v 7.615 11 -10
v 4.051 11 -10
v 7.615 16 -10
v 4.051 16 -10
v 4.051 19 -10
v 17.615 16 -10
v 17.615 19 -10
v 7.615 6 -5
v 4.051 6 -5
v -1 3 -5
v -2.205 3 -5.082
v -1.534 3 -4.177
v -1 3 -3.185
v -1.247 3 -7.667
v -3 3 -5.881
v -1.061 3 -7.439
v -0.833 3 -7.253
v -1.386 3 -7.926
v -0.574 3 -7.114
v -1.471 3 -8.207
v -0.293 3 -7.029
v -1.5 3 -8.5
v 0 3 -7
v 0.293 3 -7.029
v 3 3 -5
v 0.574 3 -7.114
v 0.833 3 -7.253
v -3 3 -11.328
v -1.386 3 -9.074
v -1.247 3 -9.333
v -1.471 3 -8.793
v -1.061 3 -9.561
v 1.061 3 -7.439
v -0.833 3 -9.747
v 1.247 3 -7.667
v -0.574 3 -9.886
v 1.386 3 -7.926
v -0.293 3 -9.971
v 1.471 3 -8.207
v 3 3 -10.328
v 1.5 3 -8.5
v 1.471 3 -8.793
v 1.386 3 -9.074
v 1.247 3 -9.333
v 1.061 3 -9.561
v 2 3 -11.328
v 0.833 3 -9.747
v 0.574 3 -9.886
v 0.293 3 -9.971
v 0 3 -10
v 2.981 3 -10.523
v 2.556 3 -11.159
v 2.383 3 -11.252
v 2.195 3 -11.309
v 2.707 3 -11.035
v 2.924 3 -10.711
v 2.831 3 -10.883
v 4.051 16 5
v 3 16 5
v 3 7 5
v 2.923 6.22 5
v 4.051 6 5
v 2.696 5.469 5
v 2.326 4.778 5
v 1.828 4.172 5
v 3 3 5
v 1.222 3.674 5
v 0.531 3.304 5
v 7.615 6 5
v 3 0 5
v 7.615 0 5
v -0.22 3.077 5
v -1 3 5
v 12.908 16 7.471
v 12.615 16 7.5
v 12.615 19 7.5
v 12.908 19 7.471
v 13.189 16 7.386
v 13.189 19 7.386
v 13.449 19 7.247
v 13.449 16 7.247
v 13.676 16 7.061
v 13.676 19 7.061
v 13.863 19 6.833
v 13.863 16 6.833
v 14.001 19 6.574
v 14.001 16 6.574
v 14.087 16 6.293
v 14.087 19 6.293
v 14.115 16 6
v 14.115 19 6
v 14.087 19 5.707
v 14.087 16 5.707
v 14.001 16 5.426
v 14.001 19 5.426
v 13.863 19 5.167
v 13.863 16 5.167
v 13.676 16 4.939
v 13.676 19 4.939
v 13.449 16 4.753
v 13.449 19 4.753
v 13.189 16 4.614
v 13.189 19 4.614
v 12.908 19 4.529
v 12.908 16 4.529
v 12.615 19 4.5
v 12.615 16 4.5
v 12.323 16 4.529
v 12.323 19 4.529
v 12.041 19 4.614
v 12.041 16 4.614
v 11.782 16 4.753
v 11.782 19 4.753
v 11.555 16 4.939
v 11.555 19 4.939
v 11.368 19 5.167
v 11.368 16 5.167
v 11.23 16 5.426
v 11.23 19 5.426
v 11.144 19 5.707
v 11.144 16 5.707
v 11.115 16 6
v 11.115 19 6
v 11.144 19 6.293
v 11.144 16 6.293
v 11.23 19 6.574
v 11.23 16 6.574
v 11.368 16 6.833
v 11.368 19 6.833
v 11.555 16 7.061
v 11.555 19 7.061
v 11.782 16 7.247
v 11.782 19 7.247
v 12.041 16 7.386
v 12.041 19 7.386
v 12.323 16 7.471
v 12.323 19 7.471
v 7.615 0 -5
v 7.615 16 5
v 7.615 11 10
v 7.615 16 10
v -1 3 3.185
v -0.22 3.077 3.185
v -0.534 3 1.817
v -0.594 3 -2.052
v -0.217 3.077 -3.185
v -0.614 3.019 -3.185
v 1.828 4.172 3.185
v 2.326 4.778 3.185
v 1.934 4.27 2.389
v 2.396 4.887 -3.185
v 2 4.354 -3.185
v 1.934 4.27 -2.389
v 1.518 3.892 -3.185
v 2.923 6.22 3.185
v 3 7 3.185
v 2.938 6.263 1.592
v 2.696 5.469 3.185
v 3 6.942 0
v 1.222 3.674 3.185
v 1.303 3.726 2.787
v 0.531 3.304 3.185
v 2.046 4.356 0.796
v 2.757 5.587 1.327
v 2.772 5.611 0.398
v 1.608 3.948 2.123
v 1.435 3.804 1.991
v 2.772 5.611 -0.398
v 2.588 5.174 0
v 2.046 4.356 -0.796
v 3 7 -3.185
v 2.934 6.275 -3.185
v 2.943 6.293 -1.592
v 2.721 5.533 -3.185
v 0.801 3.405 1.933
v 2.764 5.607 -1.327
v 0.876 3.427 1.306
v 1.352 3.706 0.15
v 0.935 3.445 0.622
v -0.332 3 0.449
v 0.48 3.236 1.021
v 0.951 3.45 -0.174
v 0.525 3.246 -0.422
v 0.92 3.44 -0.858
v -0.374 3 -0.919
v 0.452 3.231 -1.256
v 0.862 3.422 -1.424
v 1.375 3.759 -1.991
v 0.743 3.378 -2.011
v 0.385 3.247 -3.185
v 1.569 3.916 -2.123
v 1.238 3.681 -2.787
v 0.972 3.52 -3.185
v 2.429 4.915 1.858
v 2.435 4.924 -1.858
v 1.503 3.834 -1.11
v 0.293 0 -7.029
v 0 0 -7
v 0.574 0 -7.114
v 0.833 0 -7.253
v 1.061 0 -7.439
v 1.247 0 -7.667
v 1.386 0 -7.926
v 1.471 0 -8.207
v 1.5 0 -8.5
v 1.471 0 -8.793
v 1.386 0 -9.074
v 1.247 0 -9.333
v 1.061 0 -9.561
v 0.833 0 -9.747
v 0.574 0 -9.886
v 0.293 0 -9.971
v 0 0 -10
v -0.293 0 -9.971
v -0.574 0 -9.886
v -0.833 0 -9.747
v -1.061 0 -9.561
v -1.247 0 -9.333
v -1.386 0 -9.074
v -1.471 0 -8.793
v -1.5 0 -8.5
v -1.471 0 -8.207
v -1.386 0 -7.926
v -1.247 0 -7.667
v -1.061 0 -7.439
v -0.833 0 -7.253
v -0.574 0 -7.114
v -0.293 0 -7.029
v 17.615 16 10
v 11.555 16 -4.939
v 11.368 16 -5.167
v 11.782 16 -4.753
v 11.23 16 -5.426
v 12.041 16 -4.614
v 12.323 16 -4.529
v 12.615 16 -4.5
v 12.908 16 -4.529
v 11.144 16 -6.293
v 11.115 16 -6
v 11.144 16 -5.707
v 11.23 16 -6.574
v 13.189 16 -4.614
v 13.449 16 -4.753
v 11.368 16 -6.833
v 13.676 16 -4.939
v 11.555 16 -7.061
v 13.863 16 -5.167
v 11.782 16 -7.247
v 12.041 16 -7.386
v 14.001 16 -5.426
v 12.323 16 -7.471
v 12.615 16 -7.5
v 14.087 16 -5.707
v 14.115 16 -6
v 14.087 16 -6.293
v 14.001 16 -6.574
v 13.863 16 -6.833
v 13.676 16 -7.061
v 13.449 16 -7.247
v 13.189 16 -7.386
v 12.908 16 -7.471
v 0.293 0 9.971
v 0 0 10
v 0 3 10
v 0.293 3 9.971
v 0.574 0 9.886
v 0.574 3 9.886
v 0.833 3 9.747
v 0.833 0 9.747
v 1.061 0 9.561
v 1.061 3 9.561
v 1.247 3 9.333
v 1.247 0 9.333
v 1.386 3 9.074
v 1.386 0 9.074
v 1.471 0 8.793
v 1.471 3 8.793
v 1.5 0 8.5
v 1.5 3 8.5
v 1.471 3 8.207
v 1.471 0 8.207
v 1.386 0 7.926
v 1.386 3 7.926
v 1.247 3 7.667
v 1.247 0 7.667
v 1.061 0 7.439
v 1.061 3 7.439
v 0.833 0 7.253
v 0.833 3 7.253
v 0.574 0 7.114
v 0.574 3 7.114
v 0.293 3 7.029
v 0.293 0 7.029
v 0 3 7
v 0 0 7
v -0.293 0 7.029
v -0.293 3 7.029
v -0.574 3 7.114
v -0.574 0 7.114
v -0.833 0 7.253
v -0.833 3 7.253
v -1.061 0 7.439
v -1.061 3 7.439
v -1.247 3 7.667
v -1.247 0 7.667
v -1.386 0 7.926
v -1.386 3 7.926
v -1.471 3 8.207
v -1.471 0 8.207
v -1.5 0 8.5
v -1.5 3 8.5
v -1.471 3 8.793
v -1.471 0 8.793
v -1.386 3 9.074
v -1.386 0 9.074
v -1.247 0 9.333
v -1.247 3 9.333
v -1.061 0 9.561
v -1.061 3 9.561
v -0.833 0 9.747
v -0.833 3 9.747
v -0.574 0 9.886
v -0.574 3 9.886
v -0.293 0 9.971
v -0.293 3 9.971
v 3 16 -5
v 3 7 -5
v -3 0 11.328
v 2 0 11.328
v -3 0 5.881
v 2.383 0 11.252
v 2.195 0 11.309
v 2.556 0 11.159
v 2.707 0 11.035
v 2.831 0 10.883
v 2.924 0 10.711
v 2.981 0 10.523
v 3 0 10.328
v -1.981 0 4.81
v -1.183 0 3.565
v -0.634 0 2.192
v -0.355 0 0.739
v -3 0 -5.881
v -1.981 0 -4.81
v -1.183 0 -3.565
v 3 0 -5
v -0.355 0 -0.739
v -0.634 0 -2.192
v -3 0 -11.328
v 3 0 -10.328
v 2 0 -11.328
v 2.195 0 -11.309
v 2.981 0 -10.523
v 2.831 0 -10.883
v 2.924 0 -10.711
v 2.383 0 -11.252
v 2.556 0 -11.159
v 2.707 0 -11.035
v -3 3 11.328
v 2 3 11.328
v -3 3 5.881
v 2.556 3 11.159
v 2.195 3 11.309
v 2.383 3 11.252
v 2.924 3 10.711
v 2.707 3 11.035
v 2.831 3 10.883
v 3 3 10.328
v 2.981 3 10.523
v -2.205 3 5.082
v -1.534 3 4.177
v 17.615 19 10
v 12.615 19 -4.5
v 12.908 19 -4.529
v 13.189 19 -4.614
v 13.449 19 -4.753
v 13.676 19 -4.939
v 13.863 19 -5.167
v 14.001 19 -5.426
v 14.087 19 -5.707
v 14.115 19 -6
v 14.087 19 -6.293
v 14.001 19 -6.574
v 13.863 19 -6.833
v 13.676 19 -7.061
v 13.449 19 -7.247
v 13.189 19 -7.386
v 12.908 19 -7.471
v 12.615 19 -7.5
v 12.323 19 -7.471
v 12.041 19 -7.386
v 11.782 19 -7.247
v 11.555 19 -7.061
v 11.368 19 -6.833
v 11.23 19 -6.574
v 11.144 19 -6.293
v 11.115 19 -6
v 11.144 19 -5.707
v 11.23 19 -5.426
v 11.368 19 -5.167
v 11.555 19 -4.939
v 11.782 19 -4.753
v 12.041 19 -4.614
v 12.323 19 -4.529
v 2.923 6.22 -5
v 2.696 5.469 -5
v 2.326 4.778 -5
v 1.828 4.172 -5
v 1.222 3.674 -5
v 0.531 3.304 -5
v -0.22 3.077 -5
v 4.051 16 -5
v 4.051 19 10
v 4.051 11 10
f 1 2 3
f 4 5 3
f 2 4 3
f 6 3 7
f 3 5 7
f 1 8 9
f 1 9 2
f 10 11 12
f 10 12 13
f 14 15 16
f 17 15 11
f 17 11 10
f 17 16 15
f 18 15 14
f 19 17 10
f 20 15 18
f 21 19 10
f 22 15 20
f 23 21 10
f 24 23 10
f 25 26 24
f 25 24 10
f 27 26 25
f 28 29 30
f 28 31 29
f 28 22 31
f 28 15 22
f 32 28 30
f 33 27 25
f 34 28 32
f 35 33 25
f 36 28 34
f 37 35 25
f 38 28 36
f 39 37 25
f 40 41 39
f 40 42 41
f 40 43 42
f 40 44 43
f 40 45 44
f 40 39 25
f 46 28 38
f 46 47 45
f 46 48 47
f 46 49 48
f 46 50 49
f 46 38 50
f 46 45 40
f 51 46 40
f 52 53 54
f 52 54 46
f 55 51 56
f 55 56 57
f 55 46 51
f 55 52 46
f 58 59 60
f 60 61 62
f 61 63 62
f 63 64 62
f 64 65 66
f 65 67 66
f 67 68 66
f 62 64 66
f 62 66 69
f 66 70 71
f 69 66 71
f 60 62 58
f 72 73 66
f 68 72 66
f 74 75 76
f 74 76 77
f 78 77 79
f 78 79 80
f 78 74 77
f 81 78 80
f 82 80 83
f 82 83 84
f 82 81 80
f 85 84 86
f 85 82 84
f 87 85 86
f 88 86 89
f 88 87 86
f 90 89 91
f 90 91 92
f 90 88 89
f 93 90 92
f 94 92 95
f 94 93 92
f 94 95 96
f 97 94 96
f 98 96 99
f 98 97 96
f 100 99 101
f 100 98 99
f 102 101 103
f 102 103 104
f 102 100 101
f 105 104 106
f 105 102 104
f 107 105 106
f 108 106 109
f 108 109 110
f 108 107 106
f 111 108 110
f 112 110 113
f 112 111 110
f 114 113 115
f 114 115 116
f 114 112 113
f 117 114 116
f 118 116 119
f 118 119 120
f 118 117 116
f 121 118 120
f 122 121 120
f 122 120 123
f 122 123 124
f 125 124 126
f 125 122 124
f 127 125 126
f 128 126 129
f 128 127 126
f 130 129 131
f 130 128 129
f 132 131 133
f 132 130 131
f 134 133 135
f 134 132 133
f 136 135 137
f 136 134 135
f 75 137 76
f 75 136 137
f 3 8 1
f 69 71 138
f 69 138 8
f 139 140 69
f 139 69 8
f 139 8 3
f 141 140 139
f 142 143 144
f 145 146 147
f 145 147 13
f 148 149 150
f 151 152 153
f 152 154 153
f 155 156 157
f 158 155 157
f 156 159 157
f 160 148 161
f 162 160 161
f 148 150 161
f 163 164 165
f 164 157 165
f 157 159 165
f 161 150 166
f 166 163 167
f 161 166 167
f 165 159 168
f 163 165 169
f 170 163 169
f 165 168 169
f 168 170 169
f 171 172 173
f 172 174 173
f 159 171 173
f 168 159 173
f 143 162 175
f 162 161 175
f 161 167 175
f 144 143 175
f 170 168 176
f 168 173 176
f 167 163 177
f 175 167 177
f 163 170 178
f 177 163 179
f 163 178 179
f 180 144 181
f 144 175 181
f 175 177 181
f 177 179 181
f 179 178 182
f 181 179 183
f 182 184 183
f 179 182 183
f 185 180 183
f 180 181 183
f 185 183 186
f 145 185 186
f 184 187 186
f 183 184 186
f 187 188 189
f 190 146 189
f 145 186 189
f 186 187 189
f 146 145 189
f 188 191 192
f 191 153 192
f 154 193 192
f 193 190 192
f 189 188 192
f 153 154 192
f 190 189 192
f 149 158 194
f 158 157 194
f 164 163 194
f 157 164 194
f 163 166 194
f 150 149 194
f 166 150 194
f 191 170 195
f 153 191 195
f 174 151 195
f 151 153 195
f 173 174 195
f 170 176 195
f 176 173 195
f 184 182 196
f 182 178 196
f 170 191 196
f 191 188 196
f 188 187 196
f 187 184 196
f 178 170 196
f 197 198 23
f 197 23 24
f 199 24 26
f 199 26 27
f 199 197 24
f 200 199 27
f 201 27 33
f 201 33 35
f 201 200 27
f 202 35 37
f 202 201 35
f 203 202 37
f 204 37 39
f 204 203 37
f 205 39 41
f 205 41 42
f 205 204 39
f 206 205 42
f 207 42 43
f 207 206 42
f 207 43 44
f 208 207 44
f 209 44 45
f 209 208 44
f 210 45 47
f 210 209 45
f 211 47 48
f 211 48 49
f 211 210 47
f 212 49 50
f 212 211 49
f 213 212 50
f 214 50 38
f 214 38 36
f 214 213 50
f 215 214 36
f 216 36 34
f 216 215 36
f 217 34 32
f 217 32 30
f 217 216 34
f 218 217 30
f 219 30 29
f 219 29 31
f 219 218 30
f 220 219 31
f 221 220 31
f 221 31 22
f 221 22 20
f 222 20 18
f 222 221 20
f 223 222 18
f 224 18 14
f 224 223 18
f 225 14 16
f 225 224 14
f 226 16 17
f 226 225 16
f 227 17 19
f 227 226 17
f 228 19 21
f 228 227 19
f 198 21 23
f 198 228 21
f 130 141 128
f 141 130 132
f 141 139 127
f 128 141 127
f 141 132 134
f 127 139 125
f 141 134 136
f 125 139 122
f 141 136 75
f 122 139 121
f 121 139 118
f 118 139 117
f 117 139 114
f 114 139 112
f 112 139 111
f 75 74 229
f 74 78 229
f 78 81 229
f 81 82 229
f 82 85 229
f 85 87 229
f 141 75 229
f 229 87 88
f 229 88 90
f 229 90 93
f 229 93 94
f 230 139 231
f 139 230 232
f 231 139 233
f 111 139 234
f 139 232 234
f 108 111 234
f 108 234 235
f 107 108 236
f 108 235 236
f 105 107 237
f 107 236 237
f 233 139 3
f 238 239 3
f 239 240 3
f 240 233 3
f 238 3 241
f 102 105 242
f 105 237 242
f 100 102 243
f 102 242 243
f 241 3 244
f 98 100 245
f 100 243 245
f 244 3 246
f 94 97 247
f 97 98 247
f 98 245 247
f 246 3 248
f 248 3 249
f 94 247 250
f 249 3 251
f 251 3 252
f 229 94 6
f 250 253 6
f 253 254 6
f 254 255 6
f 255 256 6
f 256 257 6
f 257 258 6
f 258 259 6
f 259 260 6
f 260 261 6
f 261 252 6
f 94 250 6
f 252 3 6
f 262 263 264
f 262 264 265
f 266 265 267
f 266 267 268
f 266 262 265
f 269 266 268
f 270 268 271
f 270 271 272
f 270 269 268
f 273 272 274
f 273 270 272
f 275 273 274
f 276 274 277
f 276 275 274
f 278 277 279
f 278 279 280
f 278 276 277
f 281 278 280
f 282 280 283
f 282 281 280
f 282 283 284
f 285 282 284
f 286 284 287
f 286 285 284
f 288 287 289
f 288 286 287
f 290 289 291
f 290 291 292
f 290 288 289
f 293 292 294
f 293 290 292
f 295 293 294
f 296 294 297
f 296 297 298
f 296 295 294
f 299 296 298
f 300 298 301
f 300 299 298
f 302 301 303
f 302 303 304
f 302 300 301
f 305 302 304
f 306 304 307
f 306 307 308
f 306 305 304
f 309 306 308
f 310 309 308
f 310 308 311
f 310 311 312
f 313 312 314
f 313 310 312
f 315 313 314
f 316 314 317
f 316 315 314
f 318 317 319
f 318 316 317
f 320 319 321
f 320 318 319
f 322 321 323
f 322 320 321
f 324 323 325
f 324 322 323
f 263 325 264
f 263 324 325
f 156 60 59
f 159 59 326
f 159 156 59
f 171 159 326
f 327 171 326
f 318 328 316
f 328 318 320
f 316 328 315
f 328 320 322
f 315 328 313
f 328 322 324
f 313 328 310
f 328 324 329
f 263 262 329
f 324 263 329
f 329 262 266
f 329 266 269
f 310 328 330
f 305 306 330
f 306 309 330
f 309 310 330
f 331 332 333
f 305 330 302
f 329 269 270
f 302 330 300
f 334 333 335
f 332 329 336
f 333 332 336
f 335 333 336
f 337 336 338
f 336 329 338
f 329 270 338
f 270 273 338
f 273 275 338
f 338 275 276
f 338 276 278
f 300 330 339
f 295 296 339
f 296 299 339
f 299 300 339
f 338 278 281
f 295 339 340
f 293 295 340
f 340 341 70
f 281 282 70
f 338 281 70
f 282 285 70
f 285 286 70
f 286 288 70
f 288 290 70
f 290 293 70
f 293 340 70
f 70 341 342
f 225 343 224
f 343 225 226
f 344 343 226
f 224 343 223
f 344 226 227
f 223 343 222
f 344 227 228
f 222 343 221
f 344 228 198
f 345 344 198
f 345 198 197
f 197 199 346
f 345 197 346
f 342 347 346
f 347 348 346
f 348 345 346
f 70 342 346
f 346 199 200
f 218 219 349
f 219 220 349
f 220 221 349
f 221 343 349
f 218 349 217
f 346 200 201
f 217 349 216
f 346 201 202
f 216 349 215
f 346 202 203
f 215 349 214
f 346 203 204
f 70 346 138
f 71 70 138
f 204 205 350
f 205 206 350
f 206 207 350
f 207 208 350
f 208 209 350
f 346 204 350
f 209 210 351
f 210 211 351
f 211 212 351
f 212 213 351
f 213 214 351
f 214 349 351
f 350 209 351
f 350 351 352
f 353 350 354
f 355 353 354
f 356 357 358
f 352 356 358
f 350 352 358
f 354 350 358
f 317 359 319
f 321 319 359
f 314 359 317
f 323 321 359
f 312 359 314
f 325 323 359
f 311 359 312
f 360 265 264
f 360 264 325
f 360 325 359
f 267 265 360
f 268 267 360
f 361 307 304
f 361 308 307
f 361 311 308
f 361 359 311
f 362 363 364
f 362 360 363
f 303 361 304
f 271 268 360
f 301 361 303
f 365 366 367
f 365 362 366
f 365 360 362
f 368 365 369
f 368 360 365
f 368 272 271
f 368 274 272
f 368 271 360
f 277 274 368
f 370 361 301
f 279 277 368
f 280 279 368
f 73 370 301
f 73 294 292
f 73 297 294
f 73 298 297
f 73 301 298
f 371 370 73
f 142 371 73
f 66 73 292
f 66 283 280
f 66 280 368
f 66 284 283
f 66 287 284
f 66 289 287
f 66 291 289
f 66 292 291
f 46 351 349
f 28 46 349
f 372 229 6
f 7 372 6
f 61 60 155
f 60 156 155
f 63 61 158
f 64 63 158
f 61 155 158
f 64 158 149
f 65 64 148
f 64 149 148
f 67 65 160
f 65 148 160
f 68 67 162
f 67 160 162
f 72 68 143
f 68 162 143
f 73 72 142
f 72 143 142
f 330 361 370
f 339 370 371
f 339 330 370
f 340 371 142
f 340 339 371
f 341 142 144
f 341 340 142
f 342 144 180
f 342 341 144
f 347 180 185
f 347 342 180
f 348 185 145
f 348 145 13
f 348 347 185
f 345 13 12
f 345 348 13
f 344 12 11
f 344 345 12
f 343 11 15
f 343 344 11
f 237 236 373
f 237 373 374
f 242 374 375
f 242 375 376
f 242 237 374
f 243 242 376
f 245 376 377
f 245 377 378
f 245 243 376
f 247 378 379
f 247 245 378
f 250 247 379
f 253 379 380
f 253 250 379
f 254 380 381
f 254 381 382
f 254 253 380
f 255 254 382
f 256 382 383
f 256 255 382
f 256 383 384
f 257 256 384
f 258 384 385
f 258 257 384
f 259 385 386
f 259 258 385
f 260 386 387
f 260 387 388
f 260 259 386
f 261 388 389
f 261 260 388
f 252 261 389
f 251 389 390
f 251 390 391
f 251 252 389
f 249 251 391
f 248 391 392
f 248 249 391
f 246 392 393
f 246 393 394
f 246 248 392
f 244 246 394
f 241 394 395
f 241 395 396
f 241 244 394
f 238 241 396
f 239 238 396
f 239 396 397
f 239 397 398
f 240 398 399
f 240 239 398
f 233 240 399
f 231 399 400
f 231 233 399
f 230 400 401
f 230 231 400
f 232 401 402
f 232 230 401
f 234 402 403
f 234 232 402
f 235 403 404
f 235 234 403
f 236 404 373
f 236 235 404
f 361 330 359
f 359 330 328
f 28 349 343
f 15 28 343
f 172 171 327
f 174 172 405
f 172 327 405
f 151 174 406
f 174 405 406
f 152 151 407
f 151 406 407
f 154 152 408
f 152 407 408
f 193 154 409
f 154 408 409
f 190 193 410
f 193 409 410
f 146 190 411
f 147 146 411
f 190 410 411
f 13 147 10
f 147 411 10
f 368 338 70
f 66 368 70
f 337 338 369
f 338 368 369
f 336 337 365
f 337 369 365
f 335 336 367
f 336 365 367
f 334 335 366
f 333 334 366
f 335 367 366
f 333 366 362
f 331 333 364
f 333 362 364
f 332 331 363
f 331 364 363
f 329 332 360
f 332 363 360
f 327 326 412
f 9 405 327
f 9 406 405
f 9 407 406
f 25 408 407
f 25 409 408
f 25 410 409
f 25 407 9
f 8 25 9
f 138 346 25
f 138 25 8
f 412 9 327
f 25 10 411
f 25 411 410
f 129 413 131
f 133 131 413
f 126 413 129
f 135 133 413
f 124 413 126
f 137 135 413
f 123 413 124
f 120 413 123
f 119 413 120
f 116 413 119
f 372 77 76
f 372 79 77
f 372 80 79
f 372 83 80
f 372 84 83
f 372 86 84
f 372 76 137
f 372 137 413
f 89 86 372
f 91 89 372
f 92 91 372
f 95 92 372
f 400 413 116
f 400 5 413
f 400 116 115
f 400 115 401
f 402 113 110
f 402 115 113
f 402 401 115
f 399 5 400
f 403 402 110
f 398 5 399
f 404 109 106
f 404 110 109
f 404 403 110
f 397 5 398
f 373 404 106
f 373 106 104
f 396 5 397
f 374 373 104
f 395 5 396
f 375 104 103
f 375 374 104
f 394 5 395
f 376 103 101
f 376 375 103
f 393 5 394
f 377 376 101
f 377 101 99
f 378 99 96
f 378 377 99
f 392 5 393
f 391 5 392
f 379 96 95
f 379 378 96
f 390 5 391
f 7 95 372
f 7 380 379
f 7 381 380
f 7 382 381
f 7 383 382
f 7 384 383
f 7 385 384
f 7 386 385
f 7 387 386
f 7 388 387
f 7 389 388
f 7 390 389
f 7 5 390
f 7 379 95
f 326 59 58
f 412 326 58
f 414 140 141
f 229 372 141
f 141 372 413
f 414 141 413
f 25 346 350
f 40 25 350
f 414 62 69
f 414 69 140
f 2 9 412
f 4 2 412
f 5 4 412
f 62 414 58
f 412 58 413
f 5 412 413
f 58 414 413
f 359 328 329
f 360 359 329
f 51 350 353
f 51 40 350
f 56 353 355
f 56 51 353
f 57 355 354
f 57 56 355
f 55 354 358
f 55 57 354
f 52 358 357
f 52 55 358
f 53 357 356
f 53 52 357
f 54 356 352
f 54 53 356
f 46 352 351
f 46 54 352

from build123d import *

# Parameters (mm, degrees)
SKETCH1_R           = 1.5
BOSS_EXTRUDE1_DEPTH = 3
SKETCH3_W           = 4.615398666
SKETCH3_H           = 10
BOSS_EXTRUDE2_DEPTH = 12.9997796
FILLET7_R           = 1
CUT_EXTRUDE4_DEPTH  = 10
SKETCH9_W           = 13.564457496
SKETCH9_H           = 20
SKETCH9_R           = 1.5
BOSS_EXTRUDE3_DEPTH = 3
CHAMFER1_SIZE       = 10
CHAMFER2_SIZE       = 10
FILLET8_R           = 4


with BuildPart() as part:
    # Sketch1 → Boss-Extrude1 (new body)
    with BuildSketch(Plane(origin=(0, 0, 0), x_dir=(1, 0, 0), z_dir=(0, 1, 0))):
        Polygon((-3, -11.32792047), (3, -11.32792047), (3, -5), (7.615398666, -5), (7.615398666, 5), (3, 5), (3, 11.32792047), (-3, 11.32792047), align=None)
        with Locations(Location((0, 8.5, 0), (0, 0, 270))):
            Circle(SKETCH1_R, mode=Mode.SUBTRACT)
        with Locations(Location((0, -8.5, 0), (0, 0, 270))):
            Circle(SKETCH1_R, mode=Mode.SUBTRACT)
    extrude(amount=BOSS_EXTRUDE1_DEPTH)

    # Sketch3 → Boss-Extrude2 (add)
    with BuildSketch(Plane(origin=(0, 3, 0), x_dir=(1, 0, 0), z_dir=(0, 1, 0))):
        with Locations((5.307699333, 0)):
            Rectangle(SKETCH3_W, SKETCH3_H)
    extrude(amount=BOSS_EXTRUDE2_DEPTH)

    # Fillet7
    fillet7_edges = [part.edges().sort_by_distance(p)[0] for p in [
        (3, 1.5, 11.32792047),
        (3, 1.5, -11.32792047),
    ]]
    fillet(fillet7_edges, radius=FILLET7_R)

    # Sketch7 → Cut-Extrude4 (cut)
    with BuildSketch(Plane.XZ):
        with BuildLine():
            Line((-3.65526474, -6.392053518), (-3.78188192, 6.478485425))
            ThreePointArc((-3.78188192, 6.478485425), (-0.319780446, 0.076652438), (-3.65526474, -6.392053518))
        make_face()
    extrude(amount=-CUT_EXTRUDE4_DEPTH, mode=Mode.SUBTRACT)

    # Sketch9 → Boss-Extrude3 (add)
    with BuildSketch(Plane(origin=(0, 15.9997796, 0), x_dir=(1, 0, 0), z_dir=(0, 1, 0))):
        with Locations((10.833169918, 0)):
            Rectangle(SKETCH9_W, SKETCH9_H)
        with Locations(Location((12.615398666, 6, 0), (0, 0, 270))):
            Circle(SKETCH9_R, mode=Mode.SUBTRACT)
        with Locations(Location((12.615398666, -6, 0), (0, 0, 270))):
            Circle(SKETCH9_R, mode=Mode.SUBTRACT)
    extrude(amount=BOSS_EXTRUDE3_DEPTH)

    # Chamfer1
    # the kernel refuses this chamfer: 10 mm, written as the material it adds along each edge
    with BuildSketch(Plane(origin=(4.05094117, 15.9997796, 5), x_dir=(0, -0.9996219169112968, -0.027495876610586403), z_dir=(1, 0, 0))) as chamfer1_piece_1_section:
        Polygon((CHAMFER1_SIZE * 0.999621916911, -CHAMFER1_SIZE * 0.0274958766106), (-CHAMFER1_SIZE * 0.0274958766106, -CHAMFER1_SIZE * 0.999621916911), (0, 0), align=None)
    chamfer1_piece_1 = extrude(amount=3.564457497, mode=Mode.PRIVATE)
    chamfer1_piece_1 = split(chamfer1_piece_1, bisect_by=Plane(origin=(5.833169918, 12.110890711, 10), z_dir=(0, 0, -1)), keep=Keep.TOP, mode=Mode.PRIVATE)
    add(chamfer1_piece_1)

    # Chamfer2
    # the kernel refuses this chamfer: 10 mm, written as the material it adds along each edge
    with BuildSketch(Plane(origin=(7.615398666, 15.9997796, -5), x_dir=(0, -0.9996219169112968, 0.027495876610586403), z_dir=(-1, 0, 0))) as chamfer2_piece_1_section:
        Polygon((CHAMFER2_SIZE * 0.999621916911, -CHAMFER2_SIZE * 0.0274958766106), (-CHAMFER2_SIZE * 0.0274958766106, -CHAMFER2_SIZE * 0.999621916911), (0, 0), align=None)
    chamfer2_piece_1 = extrude(amount=3.564457497, mode=Mode.PRIVATE)
    chamfer2_piece_1 = split(chamfer2_piece_1, bisect_by=Plane(origin=(5.833169918, 12.110890711, -10), z_dir=(0, 0, 1)), keep=Keep.TOP, mode=Mode.PRIVATE)
    add(chamfer2_piece_1)

    # Fillet8
    fillet8_edges = [part.edges().sort_by_distance(p)[0] for p in [
        (3, 3, 0),
    ]]
    fillet(fillet8_edges, radius=FILLET8_R)


solid = part.part
